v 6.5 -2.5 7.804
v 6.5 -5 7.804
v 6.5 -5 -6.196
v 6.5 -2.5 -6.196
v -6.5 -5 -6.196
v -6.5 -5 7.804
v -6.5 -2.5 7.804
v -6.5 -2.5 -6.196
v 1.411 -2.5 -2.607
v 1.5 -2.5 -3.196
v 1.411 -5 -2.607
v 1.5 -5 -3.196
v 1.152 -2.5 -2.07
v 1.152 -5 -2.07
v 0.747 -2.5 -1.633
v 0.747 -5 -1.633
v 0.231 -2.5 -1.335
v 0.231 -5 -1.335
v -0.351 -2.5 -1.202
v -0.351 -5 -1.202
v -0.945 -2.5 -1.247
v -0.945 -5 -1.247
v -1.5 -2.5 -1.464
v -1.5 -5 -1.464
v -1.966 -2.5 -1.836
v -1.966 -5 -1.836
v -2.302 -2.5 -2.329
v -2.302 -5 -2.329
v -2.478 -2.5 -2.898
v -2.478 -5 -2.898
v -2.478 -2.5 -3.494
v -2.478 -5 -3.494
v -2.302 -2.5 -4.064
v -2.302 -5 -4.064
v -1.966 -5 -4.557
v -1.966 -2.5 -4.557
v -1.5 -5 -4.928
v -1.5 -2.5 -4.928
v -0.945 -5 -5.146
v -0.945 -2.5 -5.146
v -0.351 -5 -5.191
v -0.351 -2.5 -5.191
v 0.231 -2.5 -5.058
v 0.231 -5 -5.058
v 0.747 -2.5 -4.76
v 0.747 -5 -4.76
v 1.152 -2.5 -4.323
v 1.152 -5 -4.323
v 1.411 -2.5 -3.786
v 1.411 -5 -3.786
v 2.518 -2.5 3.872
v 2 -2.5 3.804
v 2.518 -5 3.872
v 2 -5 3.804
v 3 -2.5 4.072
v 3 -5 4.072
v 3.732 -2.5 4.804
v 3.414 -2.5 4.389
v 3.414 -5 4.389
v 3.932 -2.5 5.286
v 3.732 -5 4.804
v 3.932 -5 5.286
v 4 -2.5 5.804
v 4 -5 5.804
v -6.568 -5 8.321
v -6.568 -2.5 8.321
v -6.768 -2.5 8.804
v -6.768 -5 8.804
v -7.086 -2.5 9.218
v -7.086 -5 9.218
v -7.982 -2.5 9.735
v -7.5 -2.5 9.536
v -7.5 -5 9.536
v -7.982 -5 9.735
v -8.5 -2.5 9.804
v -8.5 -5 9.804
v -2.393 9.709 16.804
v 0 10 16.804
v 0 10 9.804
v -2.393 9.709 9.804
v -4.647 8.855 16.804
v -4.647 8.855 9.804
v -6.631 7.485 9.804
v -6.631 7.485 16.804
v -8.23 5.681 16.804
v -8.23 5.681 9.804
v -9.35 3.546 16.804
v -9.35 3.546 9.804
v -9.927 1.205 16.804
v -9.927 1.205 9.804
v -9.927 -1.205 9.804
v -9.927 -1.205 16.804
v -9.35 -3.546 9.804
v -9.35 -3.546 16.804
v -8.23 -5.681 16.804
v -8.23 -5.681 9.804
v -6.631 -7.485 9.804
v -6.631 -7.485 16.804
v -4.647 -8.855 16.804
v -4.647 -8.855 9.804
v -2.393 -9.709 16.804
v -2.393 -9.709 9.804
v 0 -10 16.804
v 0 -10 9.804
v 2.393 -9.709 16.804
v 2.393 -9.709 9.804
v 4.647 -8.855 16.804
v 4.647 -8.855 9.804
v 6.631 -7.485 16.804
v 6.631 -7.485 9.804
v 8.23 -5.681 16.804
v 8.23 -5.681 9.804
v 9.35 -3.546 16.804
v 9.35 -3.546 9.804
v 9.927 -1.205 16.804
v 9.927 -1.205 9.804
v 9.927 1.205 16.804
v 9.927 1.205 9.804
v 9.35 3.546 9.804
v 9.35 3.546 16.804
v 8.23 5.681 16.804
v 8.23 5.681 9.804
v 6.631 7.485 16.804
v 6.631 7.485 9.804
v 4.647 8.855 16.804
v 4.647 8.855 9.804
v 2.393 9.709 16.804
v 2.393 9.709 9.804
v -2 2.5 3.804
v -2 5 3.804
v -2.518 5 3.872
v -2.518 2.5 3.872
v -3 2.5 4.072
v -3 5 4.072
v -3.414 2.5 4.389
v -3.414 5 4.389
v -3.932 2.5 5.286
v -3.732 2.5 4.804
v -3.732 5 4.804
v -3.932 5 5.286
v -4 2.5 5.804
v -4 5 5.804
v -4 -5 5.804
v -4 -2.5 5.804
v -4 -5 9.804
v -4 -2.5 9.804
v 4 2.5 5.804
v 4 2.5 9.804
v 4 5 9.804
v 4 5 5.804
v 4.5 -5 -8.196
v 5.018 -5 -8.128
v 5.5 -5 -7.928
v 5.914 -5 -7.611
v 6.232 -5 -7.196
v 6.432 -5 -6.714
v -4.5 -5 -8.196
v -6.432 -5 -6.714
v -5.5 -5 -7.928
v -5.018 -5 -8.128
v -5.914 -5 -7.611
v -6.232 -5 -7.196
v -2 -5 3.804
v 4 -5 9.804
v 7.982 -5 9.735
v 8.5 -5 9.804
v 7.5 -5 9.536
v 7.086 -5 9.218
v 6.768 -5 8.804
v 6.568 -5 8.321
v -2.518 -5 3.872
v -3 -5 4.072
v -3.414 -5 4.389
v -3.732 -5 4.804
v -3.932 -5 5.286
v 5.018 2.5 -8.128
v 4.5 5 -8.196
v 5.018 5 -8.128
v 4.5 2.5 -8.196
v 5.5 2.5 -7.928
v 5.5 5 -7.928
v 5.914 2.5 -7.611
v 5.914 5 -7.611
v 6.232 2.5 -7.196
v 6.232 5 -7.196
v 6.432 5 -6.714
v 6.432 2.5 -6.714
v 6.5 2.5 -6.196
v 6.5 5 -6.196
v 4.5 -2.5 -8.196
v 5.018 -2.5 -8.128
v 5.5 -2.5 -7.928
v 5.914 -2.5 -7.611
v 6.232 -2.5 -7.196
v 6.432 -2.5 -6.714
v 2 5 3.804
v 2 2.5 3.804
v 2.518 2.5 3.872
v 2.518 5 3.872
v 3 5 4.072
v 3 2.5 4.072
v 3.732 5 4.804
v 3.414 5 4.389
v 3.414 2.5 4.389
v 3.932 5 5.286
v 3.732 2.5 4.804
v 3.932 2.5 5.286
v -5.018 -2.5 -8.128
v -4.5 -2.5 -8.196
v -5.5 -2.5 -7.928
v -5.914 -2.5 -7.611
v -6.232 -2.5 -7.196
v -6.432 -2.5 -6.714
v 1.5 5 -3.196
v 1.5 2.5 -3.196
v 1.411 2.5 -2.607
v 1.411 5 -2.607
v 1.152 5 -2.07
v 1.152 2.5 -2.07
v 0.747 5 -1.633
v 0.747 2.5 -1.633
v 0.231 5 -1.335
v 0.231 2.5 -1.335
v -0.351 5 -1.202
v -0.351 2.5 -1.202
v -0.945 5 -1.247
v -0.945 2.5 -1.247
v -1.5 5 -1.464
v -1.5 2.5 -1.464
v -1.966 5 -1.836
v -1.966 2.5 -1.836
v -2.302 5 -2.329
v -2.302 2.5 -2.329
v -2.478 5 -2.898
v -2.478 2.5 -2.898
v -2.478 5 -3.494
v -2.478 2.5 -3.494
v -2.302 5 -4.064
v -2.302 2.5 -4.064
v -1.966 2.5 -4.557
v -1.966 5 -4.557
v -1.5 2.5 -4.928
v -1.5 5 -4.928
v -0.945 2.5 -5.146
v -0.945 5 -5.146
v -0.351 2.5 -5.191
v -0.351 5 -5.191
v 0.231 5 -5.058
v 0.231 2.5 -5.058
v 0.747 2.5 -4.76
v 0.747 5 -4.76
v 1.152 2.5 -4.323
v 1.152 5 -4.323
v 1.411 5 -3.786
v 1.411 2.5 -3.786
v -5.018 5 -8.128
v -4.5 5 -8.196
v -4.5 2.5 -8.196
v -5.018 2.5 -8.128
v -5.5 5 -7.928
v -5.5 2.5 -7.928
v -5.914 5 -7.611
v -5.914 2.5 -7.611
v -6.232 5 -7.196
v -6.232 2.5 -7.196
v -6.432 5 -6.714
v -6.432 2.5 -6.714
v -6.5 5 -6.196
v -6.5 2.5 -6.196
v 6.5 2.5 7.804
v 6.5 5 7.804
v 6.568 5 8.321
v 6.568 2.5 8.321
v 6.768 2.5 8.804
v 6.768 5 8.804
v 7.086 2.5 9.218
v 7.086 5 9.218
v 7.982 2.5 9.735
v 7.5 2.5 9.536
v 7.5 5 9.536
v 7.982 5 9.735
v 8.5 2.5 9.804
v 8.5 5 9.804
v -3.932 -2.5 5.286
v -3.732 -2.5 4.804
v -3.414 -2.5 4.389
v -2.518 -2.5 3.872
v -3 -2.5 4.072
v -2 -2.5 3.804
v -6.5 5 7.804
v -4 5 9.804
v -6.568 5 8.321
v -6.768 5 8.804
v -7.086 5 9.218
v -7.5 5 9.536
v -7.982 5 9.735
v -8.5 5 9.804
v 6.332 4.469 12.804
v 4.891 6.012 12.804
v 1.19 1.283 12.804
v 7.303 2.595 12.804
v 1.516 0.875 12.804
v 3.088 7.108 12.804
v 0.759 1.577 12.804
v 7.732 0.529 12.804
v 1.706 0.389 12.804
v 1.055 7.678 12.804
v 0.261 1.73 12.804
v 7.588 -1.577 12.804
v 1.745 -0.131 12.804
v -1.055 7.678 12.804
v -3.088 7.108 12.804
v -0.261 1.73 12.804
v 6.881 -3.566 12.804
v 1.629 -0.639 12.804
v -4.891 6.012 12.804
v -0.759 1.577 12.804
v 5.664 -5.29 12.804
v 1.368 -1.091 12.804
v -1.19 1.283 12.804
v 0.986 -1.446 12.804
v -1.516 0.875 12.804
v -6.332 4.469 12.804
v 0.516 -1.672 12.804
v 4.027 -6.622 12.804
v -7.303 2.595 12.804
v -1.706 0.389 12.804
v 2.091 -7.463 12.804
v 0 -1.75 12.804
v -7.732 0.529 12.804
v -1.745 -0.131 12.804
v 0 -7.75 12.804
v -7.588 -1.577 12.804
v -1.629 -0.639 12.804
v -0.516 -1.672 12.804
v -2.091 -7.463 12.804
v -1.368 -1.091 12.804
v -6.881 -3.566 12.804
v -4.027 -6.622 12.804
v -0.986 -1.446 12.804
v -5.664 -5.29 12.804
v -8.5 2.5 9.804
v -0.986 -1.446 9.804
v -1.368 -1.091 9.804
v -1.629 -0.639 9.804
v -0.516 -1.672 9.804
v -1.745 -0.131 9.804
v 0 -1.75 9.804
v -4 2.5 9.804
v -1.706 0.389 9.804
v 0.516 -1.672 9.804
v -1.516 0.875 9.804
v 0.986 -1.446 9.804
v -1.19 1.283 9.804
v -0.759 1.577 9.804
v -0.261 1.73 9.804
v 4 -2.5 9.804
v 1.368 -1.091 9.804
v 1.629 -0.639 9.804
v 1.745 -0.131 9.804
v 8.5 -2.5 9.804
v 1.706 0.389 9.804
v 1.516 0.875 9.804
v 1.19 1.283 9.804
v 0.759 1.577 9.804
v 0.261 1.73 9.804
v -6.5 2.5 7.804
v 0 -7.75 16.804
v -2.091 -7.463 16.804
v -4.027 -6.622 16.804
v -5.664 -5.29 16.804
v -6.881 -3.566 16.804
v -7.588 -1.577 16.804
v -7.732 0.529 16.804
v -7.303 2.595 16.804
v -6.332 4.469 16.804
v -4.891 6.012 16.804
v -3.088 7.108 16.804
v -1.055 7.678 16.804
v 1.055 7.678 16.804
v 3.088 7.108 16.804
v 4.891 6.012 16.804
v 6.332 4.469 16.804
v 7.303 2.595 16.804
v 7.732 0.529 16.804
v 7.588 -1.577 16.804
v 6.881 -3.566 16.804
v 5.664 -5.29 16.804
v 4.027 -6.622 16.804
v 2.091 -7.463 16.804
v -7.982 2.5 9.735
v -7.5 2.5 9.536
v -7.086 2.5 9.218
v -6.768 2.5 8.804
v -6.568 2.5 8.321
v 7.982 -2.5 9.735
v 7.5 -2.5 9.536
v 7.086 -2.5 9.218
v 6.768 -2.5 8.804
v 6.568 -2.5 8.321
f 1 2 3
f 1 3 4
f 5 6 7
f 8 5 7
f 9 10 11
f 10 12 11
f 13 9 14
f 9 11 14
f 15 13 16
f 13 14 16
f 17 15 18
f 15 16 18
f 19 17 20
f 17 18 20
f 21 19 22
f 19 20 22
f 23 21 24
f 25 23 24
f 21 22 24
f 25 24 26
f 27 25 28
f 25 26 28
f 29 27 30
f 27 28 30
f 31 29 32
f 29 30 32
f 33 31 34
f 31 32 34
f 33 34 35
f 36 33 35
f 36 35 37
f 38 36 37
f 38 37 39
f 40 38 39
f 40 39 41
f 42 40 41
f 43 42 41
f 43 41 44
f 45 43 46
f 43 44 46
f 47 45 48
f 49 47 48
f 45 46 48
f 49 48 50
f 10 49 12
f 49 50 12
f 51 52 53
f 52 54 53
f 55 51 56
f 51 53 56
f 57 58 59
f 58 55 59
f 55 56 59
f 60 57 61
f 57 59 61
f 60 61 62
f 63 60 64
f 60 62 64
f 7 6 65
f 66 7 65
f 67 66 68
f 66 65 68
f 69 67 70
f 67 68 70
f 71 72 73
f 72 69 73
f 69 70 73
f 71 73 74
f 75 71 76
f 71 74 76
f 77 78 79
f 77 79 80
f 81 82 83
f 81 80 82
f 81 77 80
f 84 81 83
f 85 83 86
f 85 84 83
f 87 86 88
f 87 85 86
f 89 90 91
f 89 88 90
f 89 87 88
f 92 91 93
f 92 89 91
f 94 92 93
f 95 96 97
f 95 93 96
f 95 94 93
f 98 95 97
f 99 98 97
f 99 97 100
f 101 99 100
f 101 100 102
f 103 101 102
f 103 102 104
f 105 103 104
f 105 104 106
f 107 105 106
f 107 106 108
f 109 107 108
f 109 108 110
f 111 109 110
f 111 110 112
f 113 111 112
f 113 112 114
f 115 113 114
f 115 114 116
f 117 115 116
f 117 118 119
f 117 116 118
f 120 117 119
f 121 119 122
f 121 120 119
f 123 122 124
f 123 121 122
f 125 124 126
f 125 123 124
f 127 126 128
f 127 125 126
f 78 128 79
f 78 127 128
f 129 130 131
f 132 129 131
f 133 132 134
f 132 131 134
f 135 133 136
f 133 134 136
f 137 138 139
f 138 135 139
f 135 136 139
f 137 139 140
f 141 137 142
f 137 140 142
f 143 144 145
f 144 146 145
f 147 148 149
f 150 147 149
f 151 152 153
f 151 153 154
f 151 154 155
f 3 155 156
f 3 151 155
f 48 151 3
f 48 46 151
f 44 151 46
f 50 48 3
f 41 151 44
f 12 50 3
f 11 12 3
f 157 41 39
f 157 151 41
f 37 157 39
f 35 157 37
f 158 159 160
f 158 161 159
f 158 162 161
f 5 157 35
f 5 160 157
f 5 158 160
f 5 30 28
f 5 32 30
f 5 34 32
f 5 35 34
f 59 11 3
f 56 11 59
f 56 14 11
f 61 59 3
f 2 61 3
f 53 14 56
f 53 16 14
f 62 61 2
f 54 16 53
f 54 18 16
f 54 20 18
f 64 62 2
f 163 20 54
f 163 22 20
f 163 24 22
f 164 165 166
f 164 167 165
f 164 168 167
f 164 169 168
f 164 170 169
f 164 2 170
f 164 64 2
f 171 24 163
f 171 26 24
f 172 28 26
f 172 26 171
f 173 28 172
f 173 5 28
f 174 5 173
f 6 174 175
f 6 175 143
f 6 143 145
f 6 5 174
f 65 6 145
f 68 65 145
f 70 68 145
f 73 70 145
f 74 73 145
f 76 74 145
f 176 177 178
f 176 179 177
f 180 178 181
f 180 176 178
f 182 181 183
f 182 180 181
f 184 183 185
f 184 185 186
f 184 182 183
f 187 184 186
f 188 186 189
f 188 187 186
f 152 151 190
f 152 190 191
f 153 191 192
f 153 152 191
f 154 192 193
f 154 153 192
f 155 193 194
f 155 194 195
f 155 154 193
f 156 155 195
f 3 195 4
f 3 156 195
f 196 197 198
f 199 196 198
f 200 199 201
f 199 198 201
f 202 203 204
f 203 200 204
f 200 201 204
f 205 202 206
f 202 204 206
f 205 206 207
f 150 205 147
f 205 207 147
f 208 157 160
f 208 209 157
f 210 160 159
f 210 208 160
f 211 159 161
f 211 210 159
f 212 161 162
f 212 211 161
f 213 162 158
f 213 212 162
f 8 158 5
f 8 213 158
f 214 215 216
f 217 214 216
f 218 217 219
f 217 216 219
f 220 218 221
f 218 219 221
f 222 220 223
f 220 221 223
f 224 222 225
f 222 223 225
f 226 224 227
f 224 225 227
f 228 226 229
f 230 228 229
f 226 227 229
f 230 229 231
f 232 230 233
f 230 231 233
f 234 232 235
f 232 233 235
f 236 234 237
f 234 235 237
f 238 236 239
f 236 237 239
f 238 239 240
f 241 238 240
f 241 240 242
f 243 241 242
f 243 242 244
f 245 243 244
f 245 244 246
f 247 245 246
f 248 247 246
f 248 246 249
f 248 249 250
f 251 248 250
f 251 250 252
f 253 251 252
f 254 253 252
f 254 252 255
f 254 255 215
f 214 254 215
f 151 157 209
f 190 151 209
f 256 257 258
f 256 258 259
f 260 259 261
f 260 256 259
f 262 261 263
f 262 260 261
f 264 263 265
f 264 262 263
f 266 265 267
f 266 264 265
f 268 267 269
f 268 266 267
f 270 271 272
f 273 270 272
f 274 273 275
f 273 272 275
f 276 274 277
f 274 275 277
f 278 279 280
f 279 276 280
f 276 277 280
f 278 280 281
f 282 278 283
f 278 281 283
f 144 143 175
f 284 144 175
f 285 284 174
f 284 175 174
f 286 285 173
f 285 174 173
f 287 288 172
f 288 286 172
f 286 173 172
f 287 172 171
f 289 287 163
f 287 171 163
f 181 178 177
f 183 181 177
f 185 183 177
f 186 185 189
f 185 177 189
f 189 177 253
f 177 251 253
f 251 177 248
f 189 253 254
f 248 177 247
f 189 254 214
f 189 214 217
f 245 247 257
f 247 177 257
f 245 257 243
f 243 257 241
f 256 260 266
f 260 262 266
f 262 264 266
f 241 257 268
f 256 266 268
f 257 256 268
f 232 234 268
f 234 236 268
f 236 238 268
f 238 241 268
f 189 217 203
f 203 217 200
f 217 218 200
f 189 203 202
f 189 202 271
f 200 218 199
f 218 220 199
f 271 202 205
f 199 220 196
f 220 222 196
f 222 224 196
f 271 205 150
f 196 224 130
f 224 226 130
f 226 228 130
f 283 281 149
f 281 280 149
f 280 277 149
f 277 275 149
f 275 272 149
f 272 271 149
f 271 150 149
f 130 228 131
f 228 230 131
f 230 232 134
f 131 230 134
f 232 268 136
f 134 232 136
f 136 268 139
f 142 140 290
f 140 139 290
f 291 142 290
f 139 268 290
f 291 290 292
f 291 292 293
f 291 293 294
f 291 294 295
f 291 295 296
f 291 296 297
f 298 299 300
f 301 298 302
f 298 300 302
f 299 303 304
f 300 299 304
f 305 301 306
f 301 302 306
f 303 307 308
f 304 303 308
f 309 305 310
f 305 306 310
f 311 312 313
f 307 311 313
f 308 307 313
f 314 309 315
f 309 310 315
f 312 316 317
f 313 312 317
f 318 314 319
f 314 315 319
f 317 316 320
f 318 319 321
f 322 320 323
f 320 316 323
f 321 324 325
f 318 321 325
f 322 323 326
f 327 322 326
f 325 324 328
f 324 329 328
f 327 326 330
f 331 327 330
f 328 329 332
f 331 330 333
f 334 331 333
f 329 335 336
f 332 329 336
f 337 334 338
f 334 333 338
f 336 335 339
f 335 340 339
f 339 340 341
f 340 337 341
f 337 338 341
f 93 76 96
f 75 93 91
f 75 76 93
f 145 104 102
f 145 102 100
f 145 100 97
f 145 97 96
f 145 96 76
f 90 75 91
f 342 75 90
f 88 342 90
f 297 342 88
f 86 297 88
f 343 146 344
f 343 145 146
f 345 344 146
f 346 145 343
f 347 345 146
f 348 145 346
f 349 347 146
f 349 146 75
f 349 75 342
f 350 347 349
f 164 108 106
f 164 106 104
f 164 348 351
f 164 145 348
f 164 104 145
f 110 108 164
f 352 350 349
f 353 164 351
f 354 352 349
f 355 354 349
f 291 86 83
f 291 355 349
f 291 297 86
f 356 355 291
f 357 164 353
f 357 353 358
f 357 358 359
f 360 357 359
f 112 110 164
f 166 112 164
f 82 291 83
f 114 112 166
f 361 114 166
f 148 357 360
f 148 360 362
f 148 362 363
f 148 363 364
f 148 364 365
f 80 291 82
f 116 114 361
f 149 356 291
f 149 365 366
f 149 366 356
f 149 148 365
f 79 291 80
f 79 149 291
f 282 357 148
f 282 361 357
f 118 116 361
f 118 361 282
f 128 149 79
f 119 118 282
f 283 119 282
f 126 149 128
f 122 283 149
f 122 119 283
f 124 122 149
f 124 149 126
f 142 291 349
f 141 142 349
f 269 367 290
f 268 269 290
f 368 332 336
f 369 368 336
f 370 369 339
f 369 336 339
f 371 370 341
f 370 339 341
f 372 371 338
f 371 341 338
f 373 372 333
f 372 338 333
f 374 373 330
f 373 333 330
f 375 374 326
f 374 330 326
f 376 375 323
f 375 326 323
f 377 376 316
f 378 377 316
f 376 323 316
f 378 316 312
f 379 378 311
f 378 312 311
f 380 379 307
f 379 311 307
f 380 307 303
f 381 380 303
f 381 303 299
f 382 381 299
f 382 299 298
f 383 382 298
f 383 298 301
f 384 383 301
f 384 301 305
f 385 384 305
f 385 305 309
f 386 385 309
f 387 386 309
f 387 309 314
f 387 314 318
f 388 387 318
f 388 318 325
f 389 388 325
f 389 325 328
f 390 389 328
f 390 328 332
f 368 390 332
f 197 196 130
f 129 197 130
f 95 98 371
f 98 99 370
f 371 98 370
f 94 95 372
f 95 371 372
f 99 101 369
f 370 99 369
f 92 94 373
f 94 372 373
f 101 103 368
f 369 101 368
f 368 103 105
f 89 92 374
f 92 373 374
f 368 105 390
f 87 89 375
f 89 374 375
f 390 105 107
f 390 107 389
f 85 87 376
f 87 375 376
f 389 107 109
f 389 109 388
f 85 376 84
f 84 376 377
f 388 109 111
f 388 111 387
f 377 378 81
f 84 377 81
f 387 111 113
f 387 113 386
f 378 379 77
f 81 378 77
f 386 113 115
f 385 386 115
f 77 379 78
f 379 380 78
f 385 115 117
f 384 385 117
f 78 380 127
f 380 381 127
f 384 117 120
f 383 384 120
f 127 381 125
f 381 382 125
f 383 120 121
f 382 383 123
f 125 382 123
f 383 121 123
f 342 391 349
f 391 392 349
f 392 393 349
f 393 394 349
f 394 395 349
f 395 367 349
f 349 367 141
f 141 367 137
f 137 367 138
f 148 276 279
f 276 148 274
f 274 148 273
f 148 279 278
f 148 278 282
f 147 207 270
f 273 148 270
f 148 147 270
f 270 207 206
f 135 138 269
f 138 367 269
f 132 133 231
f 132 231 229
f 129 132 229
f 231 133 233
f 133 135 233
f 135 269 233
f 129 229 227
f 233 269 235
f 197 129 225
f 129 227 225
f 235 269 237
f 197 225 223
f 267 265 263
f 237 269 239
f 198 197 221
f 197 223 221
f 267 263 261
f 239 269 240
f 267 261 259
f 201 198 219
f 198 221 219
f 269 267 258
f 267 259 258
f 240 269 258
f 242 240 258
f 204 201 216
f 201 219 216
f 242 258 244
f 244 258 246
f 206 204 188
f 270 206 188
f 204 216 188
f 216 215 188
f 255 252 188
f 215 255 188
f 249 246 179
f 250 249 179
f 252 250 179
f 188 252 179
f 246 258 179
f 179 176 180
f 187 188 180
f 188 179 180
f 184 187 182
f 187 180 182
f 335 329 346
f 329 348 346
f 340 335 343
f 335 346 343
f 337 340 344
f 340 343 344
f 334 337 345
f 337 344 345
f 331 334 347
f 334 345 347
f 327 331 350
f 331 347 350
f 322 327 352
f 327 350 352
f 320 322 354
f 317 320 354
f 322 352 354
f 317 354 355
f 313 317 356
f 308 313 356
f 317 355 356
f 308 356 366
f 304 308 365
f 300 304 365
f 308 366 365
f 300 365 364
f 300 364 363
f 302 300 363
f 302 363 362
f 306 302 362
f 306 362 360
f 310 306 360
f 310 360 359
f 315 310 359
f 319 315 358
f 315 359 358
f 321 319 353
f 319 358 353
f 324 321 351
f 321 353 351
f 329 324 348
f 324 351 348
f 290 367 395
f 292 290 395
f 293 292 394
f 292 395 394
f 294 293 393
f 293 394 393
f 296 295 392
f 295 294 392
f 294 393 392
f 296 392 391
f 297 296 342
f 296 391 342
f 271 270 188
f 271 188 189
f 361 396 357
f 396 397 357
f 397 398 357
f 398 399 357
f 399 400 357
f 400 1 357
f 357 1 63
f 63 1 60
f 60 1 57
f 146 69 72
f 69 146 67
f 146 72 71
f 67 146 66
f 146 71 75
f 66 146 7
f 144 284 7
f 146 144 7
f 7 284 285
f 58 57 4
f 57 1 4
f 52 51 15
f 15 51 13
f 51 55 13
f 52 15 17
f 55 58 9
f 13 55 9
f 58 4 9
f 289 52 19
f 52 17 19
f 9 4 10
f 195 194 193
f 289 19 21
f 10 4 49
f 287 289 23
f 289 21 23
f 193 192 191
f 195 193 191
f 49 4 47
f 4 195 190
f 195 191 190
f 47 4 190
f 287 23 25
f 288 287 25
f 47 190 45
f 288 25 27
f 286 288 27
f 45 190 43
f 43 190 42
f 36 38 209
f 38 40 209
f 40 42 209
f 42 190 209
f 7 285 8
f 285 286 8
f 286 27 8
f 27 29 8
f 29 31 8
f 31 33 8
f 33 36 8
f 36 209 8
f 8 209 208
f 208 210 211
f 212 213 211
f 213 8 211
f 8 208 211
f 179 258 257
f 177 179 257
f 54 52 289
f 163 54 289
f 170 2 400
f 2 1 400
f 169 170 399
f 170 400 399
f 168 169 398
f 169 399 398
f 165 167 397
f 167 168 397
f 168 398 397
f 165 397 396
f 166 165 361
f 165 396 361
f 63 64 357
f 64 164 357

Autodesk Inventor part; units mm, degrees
ref_plane "YZ Plane" through (0, 0, 0) normal (1, 0, 0) x (0, 1, 0)
ref_plane "XZ Plane" through (0, 0, 0) normal (0, 1, 0) x (-1, 0, 0)
sketch "Sketch1" plane through (0, 0, 0) normal (1, 0, 0) x (0, 1, 0)
  line L0 (0, 21.5591) -> (0, -21.8295)
  line L1 (10, 16.8036) -> (0, 16.8036)
  line L2 (0, 16.8036) -> (0, 9.8036)
  line L3 (0, 9.8036) -> (10, 9.8036)
  line L4 (10, 9.8036) -> (10, 16.8036)
  line L5 (5, 9.8036) -> (0, 9.8036)
  line L6 (0, 9.8036) -> (0, -8.1964)
  line L7 (0, -8.1964) -> (5, -8.1964)
  line L8 (5, -8.1964) -> (5, 9.8036)
  line L9 (-5, 9.8036) -> (0, 9.8036)
  line L10 (0, -8.1964) -> (-5, -8.1964)
  line L11 (-5, -8.1964) -> (-5, 9.8036)
  point P0 (0, 0)
  dimension "d0" = 20
  dimension "d1" = 7
  dimension "d5" = 10
  dimension "d7" = 25
revolve "Revolution1" add sketch "Sketch1" angle 360 about axis through (0, 0, 21.5591) along (0, 0, -1) contours L1 L4 L3 L0
extrude "Extrusion1" add sketch "Sketch1" along normal mid plane 13 contours L3 L8 L7 L0 | L0 L10 L11 L9
hole "Hole1" at (0, 0, 16.8036) direction (0, 0, -1) diameter 3.5 end through all counterbore diameter 15.5 counterbore depth 4
ref_plane "Work Plane1" through (0, 0, 9.8036) normal (0, 0, 1) x (1, 0, 0)
sketch "Sketch2" plane through (6.5, 5, -8.1964) normal (0, 0, -1) x (-1, 0, 0)
  circle A0 centre (6.5, -5) radius 1.75 projected
  line L0 (6.5, -5) -> (19.0307, -5)
  line L1 (15.8465, -2.5) -> (-5.7871, -2.5)
  line L2 (-5.7871, -2.5) -> (-5.7871, -7.5)
  line L3 (-5.7871, -7.5) -> (15.8465, -7.5)
  line L4 (15.8465, -7.5) -> (15.8465, -2.5)
  point P0 (6.5, -5)
  dimension "d20" = 5
extrude "Extrusion2" cut sketch "Sketch2" against normal up to surface (18 mm away)
sketch "Sketch3" plane through (0, 0, 9.8036) normal (0, 0, -1) x (-1, 0, 0)
  line L0 (-4, 4) -> (4, 4)
  line L1 (4, 4) -> (4, -4)
  line L2 (4, -4) -> (-4, -4)
  line L3 (-4, -4) -> (-4, 4)
  line L4 (0, 0) -> (0, 10) projected
  circle A0 centre (0, 0) radius 1.75 projected
  line L5 (0, 0) -> (-11.0224, 0)
  dimension "d33" = 8
extrude "Extrusion3" cut sketch "Sketch3" along normal blind 6 contours L0 L4 A0 L5 L3 | L0 L1 L2 L3 L5 A0 L4
sketch "Sketch4" plane through (-6.5, -5, -8.1964) normal (0, -1, 0) x (1, 0, 0)
  line L0 (0, 18) -> (13, 18) projected
  line L1 (0, 0) -> (0, 18) projected
  line L2 (0, 0) -> (13, 0) projected
  line L3 (13, 18) -> (13, 0) projected
  circle A0 centre (6, 5) radius 2
  point P0 (6.5, 8.1964)
  dimension "d26" = 5
  dimension "d27" = 4
extrude "Extrusion4" cut sketch "Sketch4" against normal through all contours A0
fillet "Fillet1" radius 2 2 edges at (6.5, -3.75, 9.8036) (6.5, 3.75, 9.8036)
fillet "Fillet1" radius 2 2 edges at (-6.5, -3.75, 9.8036) (-6.5, 3.75, 9.8036)
fillet "Fillet2" radius 2 2 edges at (6.5, 3.75, -8.1964) (-6.5, 3.75, -8.1964)
sketch "Sketch5" plane through (-4, 4, 9.8036) normal (0, -1, 0) x (1, 0, 0)
  line L0 (8, 0) -> (0, 0) projected
  line L1 (0, 0) -> (0, -6) projected
  line L2 (0, -6) -> (8, -6) projected
  line L3 (8, 0) -> (8, -6) projected
  point P0 (4, -9.8036)
extrude "Extrusion5" cut sketch "Sketch5" along normal through all both and the other way through all
fillet "Fillet3" radius 2 4 edges at (4, -3.75, 3.8036) (4, 3.75, 3.8036) (-4, 3.75, 3.8036) (-4, -3.75, 3.8036)
properties part number "piston"
